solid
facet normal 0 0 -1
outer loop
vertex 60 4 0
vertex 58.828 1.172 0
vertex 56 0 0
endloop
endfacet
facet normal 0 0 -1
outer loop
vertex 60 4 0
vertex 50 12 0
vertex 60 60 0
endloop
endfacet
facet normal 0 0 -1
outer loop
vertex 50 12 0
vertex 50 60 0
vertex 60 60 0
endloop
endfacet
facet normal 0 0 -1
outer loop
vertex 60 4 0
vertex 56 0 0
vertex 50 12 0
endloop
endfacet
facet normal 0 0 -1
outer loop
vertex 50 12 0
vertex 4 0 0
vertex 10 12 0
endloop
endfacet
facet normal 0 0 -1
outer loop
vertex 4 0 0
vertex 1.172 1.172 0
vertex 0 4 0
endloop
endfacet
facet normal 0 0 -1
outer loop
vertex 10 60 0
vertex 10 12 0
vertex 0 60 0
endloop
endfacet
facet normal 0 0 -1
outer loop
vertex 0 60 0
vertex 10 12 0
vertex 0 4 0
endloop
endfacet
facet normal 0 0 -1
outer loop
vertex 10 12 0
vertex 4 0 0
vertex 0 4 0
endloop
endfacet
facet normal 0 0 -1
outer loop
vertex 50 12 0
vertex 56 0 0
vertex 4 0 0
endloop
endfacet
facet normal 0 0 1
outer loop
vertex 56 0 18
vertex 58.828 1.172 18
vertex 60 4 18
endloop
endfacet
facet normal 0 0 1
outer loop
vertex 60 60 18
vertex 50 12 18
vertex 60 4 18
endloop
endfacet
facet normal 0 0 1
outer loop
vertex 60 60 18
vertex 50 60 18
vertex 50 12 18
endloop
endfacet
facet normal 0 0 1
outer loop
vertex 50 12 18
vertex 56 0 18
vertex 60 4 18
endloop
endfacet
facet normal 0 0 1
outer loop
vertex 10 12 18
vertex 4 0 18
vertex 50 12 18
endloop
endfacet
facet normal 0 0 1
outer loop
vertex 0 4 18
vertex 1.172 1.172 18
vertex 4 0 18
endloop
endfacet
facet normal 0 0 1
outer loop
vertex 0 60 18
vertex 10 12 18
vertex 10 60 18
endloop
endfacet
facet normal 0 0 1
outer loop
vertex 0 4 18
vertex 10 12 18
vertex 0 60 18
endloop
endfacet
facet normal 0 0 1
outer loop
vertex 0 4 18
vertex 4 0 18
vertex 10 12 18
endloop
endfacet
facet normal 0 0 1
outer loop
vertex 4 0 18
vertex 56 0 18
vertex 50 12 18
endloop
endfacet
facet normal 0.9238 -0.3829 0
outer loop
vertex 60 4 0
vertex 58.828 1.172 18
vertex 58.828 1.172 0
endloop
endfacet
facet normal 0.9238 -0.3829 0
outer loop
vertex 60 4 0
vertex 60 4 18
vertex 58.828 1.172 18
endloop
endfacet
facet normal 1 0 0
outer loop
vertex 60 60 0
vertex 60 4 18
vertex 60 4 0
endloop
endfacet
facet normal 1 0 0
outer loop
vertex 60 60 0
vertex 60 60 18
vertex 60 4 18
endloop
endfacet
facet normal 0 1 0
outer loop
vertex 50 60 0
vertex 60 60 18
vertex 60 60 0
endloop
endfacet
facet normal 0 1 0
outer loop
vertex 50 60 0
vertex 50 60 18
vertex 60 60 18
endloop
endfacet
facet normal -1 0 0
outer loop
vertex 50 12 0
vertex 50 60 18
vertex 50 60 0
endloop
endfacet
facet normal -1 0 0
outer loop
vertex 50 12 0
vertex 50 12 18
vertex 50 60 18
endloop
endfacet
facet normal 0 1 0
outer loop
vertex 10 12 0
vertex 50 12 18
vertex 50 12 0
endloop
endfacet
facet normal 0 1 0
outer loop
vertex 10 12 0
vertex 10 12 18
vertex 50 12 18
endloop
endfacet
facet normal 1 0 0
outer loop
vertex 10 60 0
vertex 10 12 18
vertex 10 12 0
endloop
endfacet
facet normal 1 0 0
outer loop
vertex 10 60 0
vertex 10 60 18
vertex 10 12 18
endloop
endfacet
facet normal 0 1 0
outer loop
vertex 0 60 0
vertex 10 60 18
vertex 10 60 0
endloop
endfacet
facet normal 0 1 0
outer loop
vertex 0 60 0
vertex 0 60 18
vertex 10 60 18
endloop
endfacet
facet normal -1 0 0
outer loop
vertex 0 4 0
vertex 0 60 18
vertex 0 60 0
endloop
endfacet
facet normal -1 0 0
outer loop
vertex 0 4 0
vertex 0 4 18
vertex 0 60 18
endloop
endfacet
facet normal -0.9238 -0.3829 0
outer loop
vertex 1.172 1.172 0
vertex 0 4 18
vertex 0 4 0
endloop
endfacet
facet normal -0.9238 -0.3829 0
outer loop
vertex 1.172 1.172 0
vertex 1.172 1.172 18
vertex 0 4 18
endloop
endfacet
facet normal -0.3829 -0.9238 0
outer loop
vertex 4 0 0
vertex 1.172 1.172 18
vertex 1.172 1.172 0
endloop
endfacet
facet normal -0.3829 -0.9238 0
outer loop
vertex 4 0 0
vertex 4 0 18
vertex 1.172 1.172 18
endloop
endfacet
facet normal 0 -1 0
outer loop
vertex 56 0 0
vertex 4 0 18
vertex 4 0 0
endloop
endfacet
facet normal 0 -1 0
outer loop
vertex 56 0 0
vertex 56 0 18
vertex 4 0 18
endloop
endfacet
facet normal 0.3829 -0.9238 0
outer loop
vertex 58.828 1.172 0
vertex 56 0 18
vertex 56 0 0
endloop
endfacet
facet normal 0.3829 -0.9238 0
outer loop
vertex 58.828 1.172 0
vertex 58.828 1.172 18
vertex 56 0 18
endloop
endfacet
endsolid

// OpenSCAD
$fn = 32;

// ----------------------------------------------------------------------
// Heat sink frame: 60 x 60 mm frame, 10 mm walls
// ----------------------------------------------------------------------

// --- parameters (mm) ---
profile_height = 18;      // extrusion height
profile_points = 12;      // points of the closed outline

profile = [[0, 4], [1.172, 1.172], [4, 0], [56, 0], [58.828, 1.172], [60, 4], [60, 60], [50, 60], [50, 12], [10, 12], [10, 60], [0, 60]];  // single closed polygon, 12 points, counter clockwise

// --- the one profile operation ---
linear_extrude(height = profile_height) polygon(points = profile);
